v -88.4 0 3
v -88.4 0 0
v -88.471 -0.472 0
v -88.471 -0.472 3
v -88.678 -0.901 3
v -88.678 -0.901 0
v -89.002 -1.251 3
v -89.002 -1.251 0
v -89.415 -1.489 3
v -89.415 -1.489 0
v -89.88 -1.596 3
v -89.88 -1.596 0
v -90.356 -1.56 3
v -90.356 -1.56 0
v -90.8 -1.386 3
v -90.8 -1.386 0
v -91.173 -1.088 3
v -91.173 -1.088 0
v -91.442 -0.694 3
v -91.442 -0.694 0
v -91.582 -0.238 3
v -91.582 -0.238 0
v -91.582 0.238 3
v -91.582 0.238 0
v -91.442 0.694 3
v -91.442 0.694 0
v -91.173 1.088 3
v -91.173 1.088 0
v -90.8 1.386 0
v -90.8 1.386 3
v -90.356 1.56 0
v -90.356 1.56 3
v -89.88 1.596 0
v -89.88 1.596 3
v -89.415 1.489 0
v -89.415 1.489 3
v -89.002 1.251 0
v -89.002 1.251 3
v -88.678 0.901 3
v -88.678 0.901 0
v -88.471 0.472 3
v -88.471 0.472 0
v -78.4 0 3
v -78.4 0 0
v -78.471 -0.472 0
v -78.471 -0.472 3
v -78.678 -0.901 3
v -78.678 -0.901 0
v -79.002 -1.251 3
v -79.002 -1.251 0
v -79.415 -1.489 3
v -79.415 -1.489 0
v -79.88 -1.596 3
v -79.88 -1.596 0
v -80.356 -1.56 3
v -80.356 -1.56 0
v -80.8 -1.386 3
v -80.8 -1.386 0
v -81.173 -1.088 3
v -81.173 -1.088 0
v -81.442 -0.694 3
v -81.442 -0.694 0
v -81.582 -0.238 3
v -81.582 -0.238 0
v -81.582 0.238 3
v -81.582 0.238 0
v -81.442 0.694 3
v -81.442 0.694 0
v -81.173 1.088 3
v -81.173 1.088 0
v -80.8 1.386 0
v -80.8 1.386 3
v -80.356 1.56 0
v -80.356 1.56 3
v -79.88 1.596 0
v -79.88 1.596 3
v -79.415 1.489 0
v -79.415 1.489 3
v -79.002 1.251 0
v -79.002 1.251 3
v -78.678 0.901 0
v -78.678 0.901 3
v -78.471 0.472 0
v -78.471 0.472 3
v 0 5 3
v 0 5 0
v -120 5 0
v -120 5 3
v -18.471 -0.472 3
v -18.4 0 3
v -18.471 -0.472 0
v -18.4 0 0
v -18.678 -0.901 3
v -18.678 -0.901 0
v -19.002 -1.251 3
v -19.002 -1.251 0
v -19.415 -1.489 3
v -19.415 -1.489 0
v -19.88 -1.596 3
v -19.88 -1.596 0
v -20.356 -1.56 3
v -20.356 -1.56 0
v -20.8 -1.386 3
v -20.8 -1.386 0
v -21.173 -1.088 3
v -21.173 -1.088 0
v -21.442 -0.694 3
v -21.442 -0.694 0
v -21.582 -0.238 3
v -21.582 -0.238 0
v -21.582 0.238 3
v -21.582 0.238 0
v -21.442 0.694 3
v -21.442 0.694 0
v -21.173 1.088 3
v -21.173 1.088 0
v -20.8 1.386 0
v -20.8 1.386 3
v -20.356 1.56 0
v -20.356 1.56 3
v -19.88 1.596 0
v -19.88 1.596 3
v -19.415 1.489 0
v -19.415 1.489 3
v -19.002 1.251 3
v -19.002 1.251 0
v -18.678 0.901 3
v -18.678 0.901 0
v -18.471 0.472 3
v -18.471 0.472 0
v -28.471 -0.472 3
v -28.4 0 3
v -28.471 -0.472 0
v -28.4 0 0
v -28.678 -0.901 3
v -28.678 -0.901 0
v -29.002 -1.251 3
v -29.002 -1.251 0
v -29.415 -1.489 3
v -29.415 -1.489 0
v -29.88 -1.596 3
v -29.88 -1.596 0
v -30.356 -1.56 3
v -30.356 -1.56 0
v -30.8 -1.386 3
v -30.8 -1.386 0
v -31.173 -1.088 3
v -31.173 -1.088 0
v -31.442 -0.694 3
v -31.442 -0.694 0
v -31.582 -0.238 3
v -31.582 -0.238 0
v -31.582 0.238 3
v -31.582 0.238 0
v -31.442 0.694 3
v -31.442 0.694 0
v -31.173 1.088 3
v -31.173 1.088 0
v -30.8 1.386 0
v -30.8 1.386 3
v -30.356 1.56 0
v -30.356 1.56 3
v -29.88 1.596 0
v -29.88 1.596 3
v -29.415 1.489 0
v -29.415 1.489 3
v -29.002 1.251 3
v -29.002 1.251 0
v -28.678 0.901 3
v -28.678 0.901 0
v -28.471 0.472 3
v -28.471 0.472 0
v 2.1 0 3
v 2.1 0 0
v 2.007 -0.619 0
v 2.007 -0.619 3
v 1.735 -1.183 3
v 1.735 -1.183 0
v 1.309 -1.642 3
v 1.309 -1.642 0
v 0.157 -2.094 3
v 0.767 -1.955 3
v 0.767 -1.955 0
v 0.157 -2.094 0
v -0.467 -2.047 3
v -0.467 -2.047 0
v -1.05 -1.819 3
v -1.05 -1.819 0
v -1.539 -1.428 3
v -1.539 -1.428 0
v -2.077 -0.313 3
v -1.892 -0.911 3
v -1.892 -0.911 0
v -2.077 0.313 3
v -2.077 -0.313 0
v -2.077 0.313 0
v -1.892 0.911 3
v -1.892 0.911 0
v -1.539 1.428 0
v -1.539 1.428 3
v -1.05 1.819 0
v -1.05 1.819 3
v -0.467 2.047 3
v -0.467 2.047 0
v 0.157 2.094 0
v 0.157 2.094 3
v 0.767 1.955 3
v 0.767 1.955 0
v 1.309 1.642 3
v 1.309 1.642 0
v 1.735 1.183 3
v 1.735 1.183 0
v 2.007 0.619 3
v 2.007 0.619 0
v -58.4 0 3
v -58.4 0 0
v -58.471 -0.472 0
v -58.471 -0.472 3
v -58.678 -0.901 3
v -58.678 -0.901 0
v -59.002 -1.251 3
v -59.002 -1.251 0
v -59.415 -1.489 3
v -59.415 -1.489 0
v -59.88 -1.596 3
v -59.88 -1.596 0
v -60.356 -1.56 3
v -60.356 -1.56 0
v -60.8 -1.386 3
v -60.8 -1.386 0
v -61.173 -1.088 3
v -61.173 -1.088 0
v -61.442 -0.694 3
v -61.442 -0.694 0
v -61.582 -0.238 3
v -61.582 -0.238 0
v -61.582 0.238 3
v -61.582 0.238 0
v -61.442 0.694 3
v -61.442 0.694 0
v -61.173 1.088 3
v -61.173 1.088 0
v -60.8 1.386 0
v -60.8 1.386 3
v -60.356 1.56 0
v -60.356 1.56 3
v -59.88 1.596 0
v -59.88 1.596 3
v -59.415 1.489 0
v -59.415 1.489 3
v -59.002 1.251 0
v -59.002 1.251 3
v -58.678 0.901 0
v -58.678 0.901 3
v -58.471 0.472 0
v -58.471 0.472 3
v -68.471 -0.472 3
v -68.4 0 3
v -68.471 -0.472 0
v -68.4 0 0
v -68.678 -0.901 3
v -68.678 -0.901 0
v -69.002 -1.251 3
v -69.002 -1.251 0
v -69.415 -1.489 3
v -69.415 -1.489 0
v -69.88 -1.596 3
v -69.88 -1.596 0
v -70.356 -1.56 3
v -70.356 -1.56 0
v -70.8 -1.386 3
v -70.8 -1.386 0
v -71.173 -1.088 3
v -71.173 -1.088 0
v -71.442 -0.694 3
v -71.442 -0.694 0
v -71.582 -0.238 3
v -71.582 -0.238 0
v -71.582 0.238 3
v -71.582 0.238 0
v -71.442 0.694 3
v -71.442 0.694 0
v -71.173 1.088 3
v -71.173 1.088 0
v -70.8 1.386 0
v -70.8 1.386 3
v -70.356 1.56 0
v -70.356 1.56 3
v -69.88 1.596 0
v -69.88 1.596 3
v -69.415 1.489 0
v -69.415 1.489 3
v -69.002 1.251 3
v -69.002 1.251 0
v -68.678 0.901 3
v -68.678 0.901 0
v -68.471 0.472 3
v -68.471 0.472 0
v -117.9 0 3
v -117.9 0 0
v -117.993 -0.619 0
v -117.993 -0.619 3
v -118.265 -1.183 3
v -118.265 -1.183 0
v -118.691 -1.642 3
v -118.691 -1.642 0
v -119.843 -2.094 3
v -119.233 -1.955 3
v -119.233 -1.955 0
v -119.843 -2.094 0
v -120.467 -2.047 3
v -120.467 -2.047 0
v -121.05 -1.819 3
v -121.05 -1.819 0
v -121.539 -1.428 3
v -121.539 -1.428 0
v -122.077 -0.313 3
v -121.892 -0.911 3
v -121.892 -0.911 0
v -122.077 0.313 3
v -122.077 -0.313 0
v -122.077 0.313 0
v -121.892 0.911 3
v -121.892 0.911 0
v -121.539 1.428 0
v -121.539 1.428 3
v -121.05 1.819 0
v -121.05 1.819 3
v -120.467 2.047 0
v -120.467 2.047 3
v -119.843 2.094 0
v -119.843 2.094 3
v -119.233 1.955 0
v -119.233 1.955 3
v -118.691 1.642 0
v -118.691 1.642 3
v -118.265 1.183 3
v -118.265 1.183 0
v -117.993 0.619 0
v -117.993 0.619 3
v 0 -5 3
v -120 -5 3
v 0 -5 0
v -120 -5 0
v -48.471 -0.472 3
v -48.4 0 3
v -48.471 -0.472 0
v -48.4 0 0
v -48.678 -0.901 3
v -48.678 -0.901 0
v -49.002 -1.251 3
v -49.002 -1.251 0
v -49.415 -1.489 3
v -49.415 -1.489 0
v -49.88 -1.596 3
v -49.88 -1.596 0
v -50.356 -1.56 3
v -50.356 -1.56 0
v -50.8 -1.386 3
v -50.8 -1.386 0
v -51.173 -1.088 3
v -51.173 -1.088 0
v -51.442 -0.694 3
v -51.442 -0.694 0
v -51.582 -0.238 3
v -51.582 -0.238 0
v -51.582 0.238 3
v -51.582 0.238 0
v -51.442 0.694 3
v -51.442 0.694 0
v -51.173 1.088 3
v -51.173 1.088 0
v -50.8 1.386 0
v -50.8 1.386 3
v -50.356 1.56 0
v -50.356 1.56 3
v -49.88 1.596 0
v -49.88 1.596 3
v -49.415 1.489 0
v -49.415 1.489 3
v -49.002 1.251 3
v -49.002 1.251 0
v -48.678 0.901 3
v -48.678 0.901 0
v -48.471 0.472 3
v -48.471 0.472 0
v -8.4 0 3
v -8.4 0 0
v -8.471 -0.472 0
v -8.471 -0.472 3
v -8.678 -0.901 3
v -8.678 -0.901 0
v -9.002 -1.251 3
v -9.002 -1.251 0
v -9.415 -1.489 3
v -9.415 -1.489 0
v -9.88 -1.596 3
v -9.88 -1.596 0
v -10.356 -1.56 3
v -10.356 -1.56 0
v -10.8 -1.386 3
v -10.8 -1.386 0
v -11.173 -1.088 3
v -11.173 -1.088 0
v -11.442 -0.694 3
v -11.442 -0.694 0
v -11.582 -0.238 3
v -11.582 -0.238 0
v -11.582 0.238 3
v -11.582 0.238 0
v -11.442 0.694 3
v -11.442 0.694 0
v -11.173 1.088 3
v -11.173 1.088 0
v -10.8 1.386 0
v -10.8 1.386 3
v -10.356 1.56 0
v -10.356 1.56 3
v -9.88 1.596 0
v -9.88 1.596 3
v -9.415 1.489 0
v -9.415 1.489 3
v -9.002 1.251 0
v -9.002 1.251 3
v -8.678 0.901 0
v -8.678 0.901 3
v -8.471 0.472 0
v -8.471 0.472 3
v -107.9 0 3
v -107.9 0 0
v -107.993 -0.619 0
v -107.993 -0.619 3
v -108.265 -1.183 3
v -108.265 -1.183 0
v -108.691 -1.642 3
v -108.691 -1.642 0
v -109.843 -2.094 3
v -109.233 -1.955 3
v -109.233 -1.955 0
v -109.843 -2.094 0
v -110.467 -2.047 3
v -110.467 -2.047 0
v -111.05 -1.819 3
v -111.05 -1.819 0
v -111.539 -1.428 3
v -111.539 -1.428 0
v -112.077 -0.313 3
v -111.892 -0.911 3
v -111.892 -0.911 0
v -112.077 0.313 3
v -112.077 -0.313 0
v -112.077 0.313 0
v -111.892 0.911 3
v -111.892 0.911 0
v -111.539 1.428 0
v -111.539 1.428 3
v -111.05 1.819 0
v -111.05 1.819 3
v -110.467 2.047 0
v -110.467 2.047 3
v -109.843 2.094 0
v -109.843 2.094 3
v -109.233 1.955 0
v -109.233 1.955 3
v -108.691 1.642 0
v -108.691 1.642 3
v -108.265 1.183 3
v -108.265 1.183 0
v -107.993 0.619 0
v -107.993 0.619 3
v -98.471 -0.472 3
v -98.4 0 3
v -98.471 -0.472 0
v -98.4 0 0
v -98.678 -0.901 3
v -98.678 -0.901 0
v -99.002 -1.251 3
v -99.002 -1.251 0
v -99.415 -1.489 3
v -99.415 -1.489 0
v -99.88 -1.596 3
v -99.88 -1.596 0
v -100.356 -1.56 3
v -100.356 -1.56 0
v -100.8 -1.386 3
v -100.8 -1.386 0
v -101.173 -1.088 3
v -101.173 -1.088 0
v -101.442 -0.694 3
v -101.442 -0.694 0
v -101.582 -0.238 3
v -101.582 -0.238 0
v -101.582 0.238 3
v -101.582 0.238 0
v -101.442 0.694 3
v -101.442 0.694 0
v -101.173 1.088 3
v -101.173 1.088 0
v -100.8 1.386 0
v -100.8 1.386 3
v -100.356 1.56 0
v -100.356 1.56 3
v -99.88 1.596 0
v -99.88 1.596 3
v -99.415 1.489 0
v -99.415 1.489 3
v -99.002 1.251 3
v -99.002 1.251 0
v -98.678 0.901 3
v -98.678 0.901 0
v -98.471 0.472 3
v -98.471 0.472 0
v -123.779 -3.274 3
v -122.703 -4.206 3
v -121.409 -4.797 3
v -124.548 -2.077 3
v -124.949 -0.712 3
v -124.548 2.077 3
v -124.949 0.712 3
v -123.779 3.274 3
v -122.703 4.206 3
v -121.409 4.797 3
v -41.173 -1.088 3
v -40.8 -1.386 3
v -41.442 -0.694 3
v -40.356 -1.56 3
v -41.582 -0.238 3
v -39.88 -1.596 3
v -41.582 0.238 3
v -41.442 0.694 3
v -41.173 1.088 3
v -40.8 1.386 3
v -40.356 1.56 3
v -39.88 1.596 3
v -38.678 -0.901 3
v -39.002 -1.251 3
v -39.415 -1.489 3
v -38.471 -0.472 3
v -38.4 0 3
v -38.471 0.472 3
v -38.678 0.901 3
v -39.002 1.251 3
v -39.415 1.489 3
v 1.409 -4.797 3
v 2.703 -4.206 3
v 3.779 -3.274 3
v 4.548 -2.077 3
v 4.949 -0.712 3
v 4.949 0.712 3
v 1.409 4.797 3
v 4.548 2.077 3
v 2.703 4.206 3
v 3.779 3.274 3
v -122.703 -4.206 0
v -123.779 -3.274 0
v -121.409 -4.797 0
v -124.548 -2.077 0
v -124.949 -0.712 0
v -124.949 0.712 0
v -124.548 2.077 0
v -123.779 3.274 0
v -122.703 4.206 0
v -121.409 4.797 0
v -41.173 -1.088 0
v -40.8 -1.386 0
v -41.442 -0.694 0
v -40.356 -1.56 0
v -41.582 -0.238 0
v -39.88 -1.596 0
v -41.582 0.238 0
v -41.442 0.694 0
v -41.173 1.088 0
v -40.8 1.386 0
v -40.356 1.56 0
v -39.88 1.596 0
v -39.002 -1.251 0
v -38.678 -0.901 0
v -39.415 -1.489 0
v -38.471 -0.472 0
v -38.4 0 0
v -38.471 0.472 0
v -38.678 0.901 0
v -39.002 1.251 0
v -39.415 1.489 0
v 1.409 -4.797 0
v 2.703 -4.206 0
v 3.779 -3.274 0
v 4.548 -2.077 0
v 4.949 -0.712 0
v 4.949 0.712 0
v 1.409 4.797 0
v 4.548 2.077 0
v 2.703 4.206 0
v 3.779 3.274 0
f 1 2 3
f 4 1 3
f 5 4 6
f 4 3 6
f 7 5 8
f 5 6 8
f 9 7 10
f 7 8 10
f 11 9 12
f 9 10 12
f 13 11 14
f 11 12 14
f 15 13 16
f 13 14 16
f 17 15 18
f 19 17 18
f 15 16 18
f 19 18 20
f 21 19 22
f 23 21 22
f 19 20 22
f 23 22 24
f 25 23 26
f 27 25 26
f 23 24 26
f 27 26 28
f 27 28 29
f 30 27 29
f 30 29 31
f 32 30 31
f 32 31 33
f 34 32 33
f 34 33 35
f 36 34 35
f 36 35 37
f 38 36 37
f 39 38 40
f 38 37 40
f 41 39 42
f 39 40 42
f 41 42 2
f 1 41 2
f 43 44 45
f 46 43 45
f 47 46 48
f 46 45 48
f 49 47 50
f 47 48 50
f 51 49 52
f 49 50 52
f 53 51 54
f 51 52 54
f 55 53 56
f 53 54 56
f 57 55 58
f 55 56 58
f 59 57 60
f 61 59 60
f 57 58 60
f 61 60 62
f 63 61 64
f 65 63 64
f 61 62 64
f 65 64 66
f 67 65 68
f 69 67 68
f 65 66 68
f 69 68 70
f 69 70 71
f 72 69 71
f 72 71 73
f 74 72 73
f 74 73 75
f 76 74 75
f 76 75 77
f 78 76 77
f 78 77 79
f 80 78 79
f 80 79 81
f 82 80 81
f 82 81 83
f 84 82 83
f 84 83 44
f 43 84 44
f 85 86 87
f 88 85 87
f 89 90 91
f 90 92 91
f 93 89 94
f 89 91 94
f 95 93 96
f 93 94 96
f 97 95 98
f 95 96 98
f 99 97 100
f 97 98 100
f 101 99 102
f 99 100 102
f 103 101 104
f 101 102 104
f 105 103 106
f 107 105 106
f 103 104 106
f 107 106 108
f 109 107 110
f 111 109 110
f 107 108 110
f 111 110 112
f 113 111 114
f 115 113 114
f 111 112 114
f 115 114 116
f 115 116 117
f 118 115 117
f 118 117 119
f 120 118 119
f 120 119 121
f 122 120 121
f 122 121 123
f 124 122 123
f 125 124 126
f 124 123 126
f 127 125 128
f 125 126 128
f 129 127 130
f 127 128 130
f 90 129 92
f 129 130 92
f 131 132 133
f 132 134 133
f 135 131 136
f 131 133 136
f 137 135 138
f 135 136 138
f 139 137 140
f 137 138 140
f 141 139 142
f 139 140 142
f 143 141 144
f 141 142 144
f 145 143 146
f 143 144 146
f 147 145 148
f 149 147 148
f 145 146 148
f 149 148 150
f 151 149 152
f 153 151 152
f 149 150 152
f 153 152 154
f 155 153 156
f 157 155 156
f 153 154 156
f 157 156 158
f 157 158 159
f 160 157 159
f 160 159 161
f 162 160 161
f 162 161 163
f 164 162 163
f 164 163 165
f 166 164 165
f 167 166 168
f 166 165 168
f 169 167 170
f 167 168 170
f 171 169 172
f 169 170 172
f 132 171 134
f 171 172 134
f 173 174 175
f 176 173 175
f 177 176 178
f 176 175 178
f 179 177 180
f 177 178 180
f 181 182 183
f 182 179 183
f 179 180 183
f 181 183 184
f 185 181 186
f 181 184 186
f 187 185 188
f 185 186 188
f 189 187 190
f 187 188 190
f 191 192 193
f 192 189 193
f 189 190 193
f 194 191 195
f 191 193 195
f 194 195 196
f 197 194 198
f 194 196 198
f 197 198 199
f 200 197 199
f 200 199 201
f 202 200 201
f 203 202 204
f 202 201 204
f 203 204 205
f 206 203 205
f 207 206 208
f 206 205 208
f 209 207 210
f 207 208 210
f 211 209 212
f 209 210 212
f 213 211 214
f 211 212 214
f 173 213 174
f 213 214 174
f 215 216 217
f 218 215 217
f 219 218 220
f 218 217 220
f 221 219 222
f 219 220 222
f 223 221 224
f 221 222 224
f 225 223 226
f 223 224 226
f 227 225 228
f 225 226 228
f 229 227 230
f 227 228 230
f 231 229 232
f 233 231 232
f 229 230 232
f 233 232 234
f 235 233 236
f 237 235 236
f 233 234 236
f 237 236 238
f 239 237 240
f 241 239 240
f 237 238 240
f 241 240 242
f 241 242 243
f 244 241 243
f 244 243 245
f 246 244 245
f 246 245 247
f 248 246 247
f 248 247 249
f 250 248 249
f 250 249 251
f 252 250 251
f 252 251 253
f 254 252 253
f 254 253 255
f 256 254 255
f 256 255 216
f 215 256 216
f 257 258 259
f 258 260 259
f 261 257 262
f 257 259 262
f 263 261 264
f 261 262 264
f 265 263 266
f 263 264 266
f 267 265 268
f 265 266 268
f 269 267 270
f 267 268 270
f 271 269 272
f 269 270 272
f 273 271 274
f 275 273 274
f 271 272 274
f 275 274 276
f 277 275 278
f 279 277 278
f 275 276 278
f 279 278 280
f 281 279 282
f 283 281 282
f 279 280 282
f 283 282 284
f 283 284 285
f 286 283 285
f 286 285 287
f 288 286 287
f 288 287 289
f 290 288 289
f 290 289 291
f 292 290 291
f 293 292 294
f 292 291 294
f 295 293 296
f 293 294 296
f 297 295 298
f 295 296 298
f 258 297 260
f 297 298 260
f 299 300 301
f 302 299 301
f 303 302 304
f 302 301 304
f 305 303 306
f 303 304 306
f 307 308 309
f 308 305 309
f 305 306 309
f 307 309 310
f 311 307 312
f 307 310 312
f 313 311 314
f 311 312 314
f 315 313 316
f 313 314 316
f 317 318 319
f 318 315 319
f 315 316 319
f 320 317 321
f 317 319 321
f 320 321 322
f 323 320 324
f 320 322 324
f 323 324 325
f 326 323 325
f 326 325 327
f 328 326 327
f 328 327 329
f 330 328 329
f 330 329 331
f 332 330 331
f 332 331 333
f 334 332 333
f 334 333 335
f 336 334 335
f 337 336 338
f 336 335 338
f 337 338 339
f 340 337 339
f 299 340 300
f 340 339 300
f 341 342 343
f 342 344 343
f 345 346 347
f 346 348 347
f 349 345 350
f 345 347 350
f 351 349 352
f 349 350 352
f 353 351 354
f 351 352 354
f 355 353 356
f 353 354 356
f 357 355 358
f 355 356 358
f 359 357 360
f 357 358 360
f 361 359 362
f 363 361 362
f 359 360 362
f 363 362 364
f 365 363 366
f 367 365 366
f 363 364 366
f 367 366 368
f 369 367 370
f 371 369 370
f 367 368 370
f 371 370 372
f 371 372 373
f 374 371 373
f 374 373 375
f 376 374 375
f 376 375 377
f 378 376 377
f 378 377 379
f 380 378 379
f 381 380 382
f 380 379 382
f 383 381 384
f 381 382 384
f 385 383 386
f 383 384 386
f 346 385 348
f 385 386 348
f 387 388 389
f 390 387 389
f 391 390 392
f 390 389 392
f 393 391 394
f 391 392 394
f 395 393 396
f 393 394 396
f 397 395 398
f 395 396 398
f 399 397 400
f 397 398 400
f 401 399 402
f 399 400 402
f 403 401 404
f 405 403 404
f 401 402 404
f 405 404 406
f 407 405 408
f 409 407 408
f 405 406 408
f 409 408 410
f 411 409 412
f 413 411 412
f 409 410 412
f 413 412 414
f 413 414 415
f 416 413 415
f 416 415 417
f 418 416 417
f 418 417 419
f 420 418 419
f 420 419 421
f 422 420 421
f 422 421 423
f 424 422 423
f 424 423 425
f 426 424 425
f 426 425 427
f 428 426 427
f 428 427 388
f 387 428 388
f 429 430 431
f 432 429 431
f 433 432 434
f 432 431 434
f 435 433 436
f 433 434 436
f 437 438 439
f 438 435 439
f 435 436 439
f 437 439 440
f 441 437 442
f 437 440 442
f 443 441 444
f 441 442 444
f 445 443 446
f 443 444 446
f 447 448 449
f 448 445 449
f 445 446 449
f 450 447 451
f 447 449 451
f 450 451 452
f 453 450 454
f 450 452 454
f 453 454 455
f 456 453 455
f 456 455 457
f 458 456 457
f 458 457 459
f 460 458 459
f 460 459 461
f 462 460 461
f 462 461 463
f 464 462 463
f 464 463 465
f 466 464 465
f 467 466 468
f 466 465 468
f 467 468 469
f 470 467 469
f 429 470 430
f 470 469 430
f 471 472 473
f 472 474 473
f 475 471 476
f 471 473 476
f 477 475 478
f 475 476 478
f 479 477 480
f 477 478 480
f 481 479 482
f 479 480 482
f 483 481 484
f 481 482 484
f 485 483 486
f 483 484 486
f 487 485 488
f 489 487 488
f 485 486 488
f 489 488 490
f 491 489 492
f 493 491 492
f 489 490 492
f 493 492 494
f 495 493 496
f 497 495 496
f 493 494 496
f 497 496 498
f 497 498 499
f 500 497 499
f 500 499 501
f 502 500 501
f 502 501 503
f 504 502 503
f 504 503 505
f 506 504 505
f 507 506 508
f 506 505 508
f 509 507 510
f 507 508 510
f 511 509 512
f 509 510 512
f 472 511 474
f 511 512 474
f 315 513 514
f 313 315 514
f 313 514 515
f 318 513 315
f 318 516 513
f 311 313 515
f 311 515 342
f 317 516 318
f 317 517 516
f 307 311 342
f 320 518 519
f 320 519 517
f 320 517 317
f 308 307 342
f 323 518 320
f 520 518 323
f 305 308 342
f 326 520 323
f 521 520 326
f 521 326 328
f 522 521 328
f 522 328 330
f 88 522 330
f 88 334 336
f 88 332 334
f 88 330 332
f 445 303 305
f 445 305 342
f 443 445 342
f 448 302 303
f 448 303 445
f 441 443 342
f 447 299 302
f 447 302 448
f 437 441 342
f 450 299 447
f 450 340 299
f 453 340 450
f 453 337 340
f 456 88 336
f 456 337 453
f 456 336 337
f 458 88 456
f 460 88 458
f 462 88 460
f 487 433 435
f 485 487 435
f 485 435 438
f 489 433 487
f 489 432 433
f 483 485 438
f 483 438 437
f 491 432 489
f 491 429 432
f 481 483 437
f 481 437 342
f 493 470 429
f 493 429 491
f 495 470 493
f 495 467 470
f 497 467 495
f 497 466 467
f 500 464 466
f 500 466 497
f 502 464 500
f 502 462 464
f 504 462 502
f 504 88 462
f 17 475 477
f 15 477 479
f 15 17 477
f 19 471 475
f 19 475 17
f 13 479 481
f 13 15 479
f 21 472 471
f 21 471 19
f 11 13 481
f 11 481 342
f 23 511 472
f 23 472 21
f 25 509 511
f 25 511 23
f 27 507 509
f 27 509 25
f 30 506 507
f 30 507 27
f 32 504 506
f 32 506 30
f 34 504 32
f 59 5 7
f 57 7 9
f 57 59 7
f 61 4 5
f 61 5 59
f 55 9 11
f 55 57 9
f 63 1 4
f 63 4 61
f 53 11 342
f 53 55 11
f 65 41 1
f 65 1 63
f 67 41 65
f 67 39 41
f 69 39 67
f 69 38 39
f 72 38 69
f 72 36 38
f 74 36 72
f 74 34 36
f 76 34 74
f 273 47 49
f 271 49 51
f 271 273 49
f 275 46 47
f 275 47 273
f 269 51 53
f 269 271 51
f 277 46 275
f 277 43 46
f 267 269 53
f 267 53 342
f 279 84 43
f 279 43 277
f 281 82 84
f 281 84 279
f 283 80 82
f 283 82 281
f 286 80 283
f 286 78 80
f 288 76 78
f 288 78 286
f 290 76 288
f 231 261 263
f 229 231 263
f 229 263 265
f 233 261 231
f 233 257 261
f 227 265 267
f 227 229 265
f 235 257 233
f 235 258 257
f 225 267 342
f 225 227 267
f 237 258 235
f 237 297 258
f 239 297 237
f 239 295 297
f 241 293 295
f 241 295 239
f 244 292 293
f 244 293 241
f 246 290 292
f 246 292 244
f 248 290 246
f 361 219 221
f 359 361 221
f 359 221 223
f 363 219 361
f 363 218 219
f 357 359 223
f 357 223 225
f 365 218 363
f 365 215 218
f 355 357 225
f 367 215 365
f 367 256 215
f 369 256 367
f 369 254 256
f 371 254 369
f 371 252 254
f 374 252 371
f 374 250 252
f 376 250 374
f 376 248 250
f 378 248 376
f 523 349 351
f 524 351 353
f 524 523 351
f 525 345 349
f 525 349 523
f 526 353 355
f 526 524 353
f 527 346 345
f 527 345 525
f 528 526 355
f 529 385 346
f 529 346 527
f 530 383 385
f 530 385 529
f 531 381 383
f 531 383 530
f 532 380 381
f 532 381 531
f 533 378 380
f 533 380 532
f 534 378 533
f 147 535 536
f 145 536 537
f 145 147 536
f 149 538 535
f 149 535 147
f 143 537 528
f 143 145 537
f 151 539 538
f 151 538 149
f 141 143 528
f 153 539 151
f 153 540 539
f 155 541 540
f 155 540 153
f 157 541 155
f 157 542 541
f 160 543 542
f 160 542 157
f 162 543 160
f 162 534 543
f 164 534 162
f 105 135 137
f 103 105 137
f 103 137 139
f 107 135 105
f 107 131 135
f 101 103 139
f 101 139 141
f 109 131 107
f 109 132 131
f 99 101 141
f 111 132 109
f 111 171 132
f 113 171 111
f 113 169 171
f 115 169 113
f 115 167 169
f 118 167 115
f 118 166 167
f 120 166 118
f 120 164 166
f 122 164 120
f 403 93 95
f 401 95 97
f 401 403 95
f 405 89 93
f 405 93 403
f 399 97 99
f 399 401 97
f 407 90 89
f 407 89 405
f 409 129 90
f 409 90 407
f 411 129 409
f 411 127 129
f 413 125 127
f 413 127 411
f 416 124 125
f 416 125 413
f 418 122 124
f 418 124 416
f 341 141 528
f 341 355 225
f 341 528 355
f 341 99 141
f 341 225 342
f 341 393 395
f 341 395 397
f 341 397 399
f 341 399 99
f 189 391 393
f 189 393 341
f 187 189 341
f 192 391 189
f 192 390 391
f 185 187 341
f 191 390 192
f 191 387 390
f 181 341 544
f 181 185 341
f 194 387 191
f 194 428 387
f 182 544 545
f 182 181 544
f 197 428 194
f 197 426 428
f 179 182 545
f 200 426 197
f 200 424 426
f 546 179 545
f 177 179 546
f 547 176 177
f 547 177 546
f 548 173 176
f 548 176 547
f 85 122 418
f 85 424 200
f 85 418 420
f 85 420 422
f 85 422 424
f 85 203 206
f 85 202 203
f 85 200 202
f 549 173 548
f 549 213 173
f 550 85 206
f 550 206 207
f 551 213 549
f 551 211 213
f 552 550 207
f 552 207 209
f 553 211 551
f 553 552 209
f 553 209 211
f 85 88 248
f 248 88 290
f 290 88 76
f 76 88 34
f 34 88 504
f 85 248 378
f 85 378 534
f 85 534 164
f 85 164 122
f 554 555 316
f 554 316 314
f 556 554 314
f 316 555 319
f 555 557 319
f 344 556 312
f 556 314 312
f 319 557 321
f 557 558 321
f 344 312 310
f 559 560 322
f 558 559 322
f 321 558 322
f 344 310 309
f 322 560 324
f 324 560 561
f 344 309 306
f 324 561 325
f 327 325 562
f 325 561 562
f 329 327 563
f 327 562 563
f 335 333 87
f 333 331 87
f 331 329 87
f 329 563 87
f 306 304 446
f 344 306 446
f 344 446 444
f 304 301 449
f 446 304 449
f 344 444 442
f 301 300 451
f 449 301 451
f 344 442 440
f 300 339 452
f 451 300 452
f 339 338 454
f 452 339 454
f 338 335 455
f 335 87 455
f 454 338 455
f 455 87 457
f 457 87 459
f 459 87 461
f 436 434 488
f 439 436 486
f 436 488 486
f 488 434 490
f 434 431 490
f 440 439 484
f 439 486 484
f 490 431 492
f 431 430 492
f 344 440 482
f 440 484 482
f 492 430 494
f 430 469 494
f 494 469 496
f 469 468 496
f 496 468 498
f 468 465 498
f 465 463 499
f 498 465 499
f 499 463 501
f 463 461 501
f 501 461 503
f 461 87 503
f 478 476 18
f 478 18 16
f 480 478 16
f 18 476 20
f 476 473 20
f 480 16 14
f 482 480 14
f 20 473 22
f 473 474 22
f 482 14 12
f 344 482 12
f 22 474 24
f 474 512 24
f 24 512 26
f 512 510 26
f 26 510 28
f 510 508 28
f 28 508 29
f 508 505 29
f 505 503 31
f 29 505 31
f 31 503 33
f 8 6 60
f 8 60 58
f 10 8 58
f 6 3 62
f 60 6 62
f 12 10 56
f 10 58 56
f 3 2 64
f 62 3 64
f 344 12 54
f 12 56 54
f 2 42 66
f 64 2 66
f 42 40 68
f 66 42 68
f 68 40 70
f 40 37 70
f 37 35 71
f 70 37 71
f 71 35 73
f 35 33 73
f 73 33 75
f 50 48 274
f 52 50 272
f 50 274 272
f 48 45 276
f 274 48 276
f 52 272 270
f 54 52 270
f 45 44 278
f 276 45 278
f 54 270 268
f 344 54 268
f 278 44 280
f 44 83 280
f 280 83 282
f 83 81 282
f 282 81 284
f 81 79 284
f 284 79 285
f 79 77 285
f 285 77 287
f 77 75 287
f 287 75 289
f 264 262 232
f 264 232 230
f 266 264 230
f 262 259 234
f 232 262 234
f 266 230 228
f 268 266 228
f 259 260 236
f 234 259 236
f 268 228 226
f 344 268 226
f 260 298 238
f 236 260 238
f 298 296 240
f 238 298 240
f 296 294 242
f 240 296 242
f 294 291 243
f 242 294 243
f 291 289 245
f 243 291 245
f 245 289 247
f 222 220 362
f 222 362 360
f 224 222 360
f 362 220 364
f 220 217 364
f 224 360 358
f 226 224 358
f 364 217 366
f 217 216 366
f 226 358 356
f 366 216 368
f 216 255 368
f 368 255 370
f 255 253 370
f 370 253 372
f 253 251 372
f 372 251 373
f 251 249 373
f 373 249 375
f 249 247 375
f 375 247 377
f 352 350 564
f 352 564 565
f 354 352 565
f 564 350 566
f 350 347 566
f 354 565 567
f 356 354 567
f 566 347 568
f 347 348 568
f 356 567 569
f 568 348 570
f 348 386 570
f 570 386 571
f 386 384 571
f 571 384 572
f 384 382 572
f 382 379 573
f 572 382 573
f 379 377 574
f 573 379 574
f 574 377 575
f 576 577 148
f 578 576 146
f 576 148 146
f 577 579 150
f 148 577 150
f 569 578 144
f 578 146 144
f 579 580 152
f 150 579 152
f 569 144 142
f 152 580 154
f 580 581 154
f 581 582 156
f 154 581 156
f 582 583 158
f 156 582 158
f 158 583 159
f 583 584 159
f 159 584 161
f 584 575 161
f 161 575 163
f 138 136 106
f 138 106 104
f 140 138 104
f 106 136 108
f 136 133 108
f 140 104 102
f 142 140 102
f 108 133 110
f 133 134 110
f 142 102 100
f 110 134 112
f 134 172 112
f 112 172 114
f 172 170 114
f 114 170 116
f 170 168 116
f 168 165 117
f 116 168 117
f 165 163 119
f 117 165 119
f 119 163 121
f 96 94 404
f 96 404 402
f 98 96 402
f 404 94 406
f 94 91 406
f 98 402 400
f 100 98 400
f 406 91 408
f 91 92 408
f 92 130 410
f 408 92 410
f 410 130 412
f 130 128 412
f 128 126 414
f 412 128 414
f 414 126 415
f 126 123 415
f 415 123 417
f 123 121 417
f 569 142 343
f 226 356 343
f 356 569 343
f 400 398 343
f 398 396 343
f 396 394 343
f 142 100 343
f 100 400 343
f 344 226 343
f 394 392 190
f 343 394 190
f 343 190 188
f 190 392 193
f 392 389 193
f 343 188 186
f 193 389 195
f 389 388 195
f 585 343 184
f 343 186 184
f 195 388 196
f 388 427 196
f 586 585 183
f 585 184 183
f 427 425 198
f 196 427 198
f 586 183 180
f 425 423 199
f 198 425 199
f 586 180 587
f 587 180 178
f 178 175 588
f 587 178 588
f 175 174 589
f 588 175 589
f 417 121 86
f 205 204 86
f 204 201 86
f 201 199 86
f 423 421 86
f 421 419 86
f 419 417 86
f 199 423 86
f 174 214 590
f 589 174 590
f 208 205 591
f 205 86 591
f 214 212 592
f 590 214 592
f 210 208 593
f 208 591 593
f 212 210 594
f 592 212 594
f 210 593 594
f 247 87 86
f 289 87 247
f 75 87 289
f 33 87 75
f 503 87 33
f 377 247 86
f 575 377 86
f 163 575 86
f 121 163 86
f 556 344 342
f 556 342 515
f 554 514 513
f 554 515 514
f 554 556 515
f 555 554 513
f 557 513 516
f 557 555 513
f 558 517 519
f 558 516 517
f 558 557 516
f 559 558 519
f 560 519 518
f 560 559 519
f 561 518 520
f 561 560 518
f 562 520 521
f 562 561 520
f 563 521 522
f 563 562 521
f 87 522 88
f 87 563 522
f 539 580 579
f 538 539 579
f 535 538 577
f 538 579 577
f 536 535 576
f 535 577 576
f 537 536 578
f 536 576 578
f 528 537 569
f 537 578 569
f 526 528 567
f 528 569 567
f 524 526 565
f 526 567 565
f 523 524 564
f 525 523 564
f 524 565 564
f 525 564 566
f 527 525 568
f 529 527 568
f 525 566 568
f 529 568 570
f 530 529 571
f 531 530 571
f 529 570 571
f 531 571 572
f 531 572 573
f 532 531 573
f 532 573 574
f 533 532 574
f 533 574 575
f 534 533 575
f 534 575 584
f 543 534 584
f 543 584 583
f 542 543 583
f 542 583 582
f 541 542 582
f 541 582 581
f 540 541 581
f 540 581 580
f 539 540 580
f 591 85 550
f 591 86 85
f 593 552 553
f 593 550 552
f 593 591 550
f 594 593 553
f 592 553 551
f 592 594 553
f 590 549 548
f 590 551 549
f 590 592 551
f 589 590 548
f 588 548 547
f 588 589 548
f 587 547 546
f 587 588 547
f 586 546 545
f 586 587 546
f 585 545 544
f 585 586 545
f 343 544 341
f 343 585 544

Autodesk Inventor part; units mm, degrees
ref_plane "YZ Plane" through (0, 0, 0) normal (1, 0, 0) x (0, 1, 0)
ref_plane "XZ Plane" through (0, 0, 0) normal (0, 1, 0) x (-1, 0, 0)
ref_plane "XY Plane" through (0, 0, 0) normal (0, 0, 1) x (1, 0, 0)
sketch "草圖1" plane through (0, 0, 0) normal (0, 0, 1) x (1, 0, 0)
  line L0 (-120, 0) -> (0, 0) construction
  line L1 (-120, -5) -> (0, -5)
  line L2 (0, 5) -> (-120, 5)
  arc A0 (-120, 5) -> (-120, -5) centre (-120, 0) ccw
  arc A1 (0, -5) -> (0, 5) centre (0, 0) ccw
  circle A2 centre (-120, 0) radius 2.1
  circle A3 centre (0, 0) radius 2.1
  circle A4 centre (-110, 0) radius 2.1
  circle A5 centre (-100, 0) radius 1.6
  circle A6 centre (-90, 0) radius 1.6
  circle A7 centre (-80, 0) radius 1.6
  circle A8 centre (-70, 0) radius 1.6
  circle A9 centre (-60, 0) radius 1.6
  circle A10 centre (-50, 0) radius 1.6
  circle A11 centre (-40, 0) radius 1.6
  circle A12 centre (-30, 0) radius 1.6
  circle A13 centre (-20, 0) radius 1.6
  circle A14 centre (-10, 0) radius 1.6
  dimension "d0" = 120
  dimension "d1" = 10
  dimension "d2" = 4.2
  dimension "d3" = 4.2
  dimension "d4" = 4.2
  dimension "d11" = 3.2
  dimension "d12" = 10
  dimension "d13" = 10
  dimension "d16" = 10
extrude "擠出1" add sketch "草圖1" along normal blind 3 contours A0 L2 A1 L1 | A5 | A6 | A7 | A8 | A9 | A10 | A11 | A12 | A13 | A14
extrude "擠出2" cut sketch "草圖1" along normal blind 10 contours A5 | A6 | A7 | A8 | A9 | A10 | A11 | A12 | A13 | A14
sketch "草圖3" plane through (0, 0, 3) normal (0, 0, 1) x (1, 0, 0)
  circle A0 centre (-10, 0) radius 1.6 projected
  circle A1 centre (-50, 0) radius 1.6 projected
  circle A2 centre (-80, 0) radius 1.6 projected
  circle A3 centre (-40, 0) radius 1.6 projected
  circle A4 centre (-90, 0) radius 1.6 projected
  circle A5 centre (-20, 0) radius 1.6 projected
  circle A6 centre (-60, 0) radius 1.6 projected
  circle A7 centre (-70, 0) radius 1.6 projected
  circle A8 centre (-30, 0) radius 1.6 projected
  circle A9 centre (-100, 0) radius 1.6 projected
  arc A10 (0, -5) -> (0, 5) centre (0, 0) ccw projected
  line L0 (0, 5) -> (-120, 5) projected
  arc A11 (-120, 5) -> (-120, -5) centre (-120, 0) ccw projected
  line L1 (-120, -5) -> (0, -5) projected
  circle A12 centre (0, 0) radius 2.1 projected
  circle A13 centre (-110, 0) radius 2.1 projected
  circle A14 centre (-120, 0) radius 2.1 projected
properties part number "adjustable"
